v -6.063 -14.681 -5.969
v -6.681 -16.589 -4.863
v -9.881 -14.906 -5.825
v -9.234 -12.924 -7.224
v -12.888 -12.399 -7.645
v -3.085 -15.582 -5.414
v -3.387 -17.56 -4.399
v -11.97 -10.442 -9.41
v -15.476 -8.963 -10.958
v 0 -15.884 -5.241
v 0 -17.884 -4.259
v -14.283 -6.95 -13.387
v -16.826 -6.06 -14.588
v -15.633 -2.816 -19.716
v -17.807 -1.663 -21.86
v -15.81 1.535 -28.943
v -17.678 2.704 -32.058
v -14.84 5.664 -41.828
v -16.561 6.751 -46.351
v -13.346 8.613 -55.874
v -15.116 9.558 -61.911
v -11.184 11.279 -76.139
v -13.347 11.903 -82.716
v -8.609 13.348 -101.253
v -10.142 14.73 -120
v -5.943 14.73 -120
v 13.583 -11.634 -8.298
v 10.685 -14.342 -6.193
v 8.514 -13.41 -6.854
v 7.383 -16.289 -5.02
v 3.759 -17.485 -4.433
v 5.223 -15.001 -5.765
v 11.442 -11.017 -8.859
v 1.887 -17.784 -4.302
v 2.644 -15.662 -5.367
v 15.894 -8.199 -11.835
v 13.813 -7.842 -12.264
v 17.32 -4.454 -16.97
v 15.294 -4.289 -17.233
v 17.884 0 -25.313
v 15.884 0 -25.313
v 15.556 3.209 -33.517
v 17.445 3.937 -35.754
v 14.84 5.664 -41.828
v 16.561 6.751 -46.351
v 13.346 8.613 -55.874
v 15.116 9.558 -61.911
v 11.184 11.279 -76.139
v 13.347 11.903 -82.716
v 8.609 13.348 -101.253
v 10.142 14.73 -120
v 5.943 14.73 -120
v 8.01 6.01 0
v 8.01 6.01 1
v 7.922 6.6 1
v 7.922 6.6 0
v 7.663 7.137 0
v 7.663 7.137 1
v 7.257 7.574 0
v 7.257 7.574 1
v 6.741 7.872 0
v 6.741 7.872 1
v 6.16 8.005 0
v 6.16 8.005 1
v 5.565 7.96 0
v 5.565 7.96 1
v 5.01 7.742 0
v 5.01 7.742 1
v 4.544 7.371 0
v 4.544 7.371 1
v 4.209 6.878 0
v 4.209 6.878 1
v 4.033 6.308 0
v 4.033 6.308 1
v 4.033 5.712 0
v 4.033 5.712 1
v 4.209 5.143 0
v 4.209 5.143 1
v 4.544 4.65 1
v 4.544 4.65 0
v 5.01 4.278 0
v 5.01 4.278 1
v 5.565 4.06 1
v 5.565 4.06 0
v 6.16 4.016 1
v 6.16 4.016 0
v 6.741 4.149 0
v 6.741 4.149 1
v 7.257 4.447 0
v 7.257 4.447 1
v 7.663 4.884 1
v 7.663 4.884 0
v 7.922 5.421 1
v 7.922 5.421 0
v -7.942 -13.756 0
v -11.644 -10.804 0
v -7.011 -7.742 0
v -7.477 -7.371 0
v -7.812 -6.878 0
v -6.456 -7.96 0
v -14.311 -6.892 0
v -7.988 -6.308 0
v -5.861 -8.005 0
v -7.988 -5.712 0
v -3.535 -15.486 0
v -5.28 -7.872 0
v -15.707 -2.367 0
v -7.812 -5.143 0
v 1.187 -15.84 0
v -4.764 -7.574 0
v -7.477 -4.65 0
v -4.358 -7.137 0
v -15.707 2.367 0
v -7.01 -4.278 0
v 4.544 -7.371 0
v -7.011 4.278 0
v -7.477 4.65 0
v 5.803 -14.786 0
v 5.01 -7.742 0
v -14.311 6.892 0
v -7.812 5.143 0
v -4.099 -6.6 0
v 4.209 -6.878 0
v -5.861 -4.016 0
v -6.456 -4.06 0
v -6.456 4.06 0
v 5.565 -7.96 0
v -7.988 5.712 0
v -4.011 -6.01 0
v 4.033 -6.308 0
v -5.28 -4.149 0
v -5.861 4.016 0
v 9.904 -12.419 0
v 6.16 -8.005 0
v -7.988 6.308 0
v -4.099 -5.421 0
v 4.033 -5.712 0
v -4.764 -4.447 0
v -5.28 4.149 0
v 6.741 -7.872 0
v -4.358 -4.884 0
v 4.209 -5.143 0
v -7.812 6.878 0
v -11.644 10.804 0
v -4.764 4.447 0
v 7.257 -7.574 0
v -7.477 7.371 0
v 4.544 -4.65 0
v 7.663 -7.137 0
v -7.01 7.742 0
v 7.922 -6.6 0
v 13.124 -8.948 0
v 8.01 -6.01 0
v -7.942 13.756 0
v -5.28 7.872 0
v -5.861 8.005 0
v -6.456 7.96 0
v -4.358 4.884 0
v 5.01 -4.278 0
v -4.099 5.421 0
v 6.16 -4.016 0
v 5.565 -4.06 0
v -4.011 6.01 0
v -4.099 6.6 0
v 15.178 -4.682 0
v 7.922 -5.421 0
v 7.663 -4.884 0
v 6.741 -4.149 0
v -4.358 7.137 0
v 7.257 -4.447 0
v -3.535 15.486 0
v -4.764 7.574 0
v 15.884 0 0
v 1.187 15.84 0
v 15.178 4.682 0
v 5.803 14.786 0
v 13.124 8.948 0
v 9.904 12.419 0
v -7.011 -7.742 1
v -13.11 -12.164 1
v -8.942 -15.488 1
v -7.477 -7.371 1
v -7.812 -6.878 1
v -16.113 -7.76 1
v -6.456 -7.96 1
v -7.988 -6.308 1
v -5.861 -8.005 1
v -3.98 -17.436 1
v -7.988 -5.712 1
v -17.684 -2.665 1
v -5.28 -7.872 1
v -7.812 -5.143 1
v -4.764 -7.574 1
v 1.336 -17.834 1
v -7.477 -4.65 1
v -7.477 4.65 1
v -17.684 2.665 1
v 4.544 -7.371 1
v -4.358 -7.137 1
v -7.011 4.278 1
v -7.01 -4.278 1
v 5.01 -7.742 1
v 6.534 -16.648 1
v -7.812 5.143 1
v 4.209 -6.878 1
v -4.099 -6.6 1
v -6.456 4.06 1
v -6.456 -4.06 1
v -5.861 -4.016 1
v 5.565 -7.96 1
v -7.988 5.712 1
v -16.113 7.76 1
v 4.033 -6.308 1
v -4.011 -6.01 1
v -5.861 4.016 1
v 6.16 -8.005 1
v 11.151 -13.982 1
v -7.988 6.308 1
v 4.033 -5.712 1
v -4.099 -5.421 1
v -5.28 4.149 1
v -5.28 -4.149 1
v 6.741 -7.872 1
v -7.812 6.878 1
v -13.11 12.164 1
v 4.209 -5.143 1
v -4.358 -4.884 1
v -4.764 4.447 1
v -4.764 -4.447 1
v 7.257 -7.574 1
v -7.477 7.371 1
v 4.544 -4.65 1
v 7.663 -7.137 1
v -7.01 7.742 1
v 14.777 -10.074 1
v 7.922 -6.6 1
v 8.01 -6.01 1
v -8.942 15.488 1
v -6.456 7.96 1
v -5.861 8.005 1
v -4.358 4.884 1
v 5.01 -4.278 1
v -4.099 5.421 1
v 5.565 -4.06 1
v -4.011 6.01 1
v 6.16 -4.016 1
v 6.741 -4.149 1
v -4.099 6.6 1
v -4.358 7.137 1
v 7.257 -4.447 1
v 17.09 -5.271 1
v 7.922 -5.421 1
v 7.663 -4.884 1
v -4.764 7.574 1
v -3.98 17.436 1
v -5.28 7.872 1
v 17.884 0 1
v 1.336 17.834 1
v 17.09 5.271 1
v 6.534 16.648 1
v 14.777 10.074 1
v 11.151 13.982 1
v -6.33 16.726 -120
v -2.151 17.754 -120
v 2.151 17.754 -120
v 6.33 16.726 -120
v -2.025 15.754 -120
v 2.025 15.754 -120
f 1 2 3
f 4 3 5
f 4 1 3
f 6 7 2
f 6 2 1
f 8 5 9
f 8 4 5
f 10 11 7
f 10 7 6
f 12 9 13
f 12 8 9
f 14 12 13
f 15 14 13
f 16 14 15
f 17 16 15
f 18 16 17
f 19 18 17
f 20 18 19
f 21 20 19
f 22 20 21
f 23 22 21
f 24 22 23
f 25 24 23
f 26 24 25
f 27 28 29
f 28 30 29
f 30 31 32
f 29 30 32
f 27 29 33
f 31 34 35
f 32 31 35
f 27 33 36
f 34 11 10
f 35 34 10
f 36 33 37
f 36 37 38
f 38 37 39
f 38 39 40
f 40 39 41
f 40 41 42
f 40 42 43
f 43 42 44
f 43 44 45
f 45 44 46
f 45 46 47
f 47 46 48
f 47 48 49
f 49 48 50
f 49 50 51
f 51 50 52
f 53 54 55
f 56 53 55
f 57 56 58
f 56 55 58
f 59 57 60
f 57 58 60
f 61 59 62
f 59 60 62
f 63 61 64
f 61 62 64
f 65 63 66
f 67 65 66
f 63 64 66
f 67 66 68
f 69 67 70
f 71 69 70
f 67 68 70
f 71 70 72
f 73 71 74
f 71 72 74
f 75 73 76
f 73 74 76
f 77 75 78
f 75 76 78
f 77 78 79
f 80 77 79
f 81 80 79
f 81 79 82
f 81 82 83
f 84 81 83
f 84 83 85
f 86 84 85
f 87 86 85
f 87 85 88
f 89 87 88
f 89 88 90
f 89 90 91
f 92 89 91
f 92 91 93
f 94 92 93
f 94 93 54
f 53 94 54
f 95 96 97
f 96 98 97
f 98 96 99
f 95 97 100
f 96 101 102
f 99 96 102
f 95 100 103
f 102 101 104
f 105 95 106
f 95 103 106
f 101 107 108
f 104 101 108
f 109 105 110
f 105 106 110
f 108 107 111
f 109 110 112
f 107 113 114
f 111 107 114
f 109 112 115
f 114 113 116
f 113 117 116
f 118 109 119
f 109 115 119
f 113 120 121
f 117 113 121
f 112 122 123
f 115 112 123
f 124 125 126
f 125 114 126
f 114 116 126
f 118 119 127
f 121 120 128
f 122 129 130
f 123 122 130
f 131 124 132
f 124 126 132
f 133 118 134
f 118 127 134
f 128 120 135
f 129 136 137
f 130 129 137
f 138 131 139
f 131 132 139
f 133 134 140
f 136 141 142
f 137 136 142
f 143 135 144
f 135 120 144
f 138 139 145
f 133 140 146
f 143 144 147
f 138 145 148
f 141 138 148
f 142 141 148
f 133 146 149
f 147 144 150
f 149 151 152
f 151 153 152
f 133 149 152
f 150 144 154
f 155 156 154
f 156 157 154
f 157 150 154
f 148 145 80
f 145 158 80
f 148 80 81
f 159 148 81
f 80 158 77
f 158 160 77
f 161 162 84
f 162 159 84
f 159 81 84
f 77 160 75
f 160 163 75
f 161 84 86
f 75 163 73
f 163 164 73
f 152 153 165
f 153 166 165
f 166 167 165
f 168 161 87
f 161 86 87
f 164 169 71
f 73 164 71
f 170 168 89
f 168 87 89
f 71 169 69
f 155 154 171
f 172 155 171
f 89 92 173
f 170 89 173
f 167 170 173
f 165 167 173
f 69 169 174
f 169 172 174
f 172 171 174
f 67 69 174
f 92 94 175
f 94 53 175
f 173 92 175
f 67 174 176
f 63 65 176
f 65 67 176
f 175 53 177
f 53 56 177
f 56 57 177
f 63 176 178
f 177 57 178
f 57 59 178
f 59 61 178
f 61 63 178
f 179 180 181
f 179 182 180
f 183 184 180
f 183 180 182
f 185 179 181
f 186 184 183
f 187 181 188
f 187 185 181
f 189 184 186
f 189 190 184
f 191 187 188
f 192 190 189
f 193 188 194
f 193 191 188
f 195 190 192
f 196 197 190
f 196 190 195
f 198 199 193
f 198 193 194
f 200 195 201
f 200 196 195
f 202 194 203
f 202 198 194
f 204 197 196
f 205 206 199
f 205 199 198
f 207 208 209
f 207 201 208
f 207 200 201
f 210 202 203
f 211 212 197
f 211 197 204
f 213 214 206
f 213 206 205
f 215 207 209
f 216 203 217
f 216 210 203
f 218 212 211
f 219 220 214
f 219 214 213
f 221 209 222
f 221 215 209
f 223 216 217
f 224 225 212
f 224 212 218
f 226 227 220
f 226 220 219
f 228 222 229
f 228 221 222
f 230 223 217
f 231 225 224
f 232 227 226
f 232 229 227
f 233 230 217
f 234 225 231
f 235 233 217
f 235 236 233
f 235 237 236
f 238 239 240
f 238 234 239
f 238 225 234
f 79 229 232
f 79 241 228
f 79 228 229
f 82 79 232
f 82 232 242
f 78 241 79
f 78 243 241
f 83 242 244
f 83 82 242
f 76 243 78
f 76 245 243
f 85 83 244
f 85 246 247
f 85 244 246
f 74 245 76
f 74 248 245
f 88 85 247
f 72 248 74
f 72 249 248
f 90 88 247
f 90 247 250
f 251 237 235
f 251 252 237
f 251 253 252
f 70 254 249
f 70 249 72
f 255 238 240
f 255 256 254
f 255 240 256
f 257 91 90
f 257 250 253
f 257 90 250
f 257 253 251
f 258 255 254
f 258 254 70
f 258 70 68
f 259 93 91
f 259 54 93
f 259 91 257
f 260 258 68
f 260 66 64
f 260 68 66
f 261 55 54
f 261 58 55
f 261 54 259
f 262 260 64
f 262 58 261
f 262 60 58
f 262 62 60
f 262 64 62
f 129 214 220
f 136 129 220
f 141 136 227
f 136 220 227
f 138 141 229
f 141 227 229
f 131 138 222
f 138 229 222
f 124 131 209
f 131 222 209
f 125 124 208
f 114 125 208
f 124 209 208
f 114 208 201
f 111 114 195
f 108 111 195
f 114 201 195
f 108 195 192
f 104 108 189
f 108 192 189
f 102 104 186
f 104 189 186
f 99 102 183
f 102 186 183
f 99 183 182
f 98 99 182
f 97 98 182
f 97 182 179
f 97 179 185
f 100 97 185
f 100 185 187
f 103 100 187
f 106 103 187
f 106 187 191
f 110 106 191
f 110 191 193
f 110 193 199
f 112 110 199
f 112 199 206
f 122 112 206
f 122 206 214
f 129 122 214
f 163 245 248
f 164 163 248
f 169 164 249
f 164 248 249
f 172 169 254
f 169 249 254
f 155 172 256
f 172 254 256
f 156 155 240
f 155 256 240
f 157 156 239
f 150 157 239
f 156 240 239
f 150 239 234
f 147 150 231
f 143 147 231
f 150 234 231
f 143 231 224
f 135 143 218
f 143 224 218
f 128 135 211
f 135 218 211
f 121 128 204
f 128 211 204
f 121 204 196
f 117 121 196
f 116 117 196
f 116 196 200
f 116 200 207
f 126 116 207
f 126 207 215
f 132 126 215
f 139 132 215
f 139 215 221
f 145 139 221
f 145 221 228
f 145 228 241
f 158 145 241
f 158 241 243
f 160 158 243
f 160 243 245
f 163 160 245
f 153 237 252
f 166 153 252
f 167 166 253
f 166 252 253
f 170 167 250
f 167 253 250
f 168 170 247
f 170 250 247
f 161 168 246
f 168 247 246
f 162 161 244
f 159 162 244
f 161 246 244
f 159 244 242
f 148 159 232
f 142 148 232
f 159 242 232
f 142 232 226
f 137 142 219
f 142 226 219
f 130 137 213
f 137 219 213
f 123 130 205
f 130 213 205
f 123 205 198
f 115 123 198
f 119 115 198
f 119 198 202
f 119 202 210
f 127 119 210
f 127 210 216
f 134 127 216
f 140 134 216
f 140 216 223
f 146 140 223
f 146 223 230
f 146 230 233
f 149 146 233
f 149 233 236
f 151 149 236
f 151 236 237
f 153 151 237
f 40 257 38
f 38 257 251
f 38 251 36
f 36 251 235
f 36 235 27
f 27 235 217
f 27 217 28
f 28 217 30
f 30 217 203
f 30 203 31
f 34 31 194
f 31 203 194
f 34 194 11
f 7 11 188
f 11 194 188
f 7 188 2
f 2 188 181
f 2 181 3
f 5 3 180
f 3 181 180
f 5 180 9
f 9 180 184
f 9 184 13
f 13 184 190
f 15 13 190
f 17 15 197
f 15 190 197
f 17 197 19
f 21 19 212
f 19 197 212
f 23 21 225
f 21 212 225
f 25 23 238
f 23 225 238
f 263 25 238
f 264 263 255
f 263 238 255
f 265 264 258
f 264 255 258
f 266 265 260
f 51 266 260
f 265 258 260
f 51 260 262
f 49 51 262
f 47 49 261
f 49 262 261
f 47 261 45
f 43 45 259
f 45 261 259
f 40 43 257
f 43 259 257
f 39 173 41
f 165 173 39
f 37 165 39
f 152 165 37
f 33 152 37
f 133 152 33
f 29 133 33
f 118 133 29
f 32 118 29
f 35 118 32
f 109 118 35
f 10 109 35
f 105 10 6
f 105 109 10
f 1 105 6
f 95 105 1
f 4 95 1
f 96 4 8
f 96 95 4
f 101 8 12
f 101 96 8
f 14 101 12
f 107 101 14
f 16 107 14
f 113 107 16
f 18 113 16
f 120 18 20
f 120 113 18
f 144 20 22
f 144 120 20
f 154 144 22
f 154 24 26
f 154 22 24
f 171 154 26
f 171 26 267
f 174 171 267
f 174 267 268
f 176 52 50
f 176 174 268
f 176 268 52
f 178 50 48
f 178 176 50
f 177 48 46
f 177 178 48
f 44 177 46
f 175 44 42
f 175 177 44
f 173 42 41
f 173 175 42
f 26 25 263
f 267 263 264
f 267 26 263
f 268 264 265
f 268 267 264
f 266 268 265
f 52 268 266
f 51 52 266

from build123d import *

# Parameters (mm, degrees)
F0_R     = 17.884061545
F1_DEPTH = 1
F2_R     = 17.884061545
F2_R_2   = 15.884061545
F3_DEPTH = 120
F5_DEPTH = 100
F6_R     = 2
F7_DEPTH = 121.0010007


with BuildPart() as f1:
    # F0 (on Top) → F1 (new body)
    with BuildSketch(Plane.XY):
        Circle(F0_R)
    extrude(amount=F1_DEPTH)

    # F2 (on face) → F3 (join)
    with BuildSketch(Plane(origin=(0, 0, 0), x_dir=(1, 0, 0), z_dir=(0, 0, -1))):
        Circle(F2_R)
        Circle(F2_R_2, mode=Mode.SUBTRACT)
    extrude(amount=F3_DEPTH)

    # F4 (on Right) → F5 (cut, symmetric)
    with BuildSketch(Plane.YZ):
        with BuildLine():
            add(Edge.make_bspline(
                [(-23.545185104, -2.931100782), (-12.2797633222, -3.5261581086), (11.4767752963, -34.9586093489), (12.414609837, -94.1865478451), (15.1815395802, -125.3380775452)],
                knots=[0, 0, 0, 0, 0.3949910862, 1, 1, 1, 1], degree=3))
            Line((-23.545185104, -2.931100782), (-23.545185104, -130.5240243673))
            Line((-23.545185104, -130.5240243673), (15.1815395802, -125.3380775452))
        make_face()
    extrude(amount=F5_DEPTH, both=True, mode=Mode.SUBTRACT)

    # F6 (on face) → F7 (cut, through all)
    with BuildSketch(Plane.XY.offset(1)):
        with Locations((-6.0105, 6.0103152788)):
            Circle(F6_R)
        with Locations((6.0105, 6.0103152788)):
            Circle(F6_R)
        with Locations((6.0105, -6.0103152788)):
            Circle(F6_R)
        with Locations((-6.0105, -6.0103152788)):
            Circle(F6_R)
    extrude(amount=-F7_DEPTH, mode=Mode.SUBTRACT)


solid = f1.part
